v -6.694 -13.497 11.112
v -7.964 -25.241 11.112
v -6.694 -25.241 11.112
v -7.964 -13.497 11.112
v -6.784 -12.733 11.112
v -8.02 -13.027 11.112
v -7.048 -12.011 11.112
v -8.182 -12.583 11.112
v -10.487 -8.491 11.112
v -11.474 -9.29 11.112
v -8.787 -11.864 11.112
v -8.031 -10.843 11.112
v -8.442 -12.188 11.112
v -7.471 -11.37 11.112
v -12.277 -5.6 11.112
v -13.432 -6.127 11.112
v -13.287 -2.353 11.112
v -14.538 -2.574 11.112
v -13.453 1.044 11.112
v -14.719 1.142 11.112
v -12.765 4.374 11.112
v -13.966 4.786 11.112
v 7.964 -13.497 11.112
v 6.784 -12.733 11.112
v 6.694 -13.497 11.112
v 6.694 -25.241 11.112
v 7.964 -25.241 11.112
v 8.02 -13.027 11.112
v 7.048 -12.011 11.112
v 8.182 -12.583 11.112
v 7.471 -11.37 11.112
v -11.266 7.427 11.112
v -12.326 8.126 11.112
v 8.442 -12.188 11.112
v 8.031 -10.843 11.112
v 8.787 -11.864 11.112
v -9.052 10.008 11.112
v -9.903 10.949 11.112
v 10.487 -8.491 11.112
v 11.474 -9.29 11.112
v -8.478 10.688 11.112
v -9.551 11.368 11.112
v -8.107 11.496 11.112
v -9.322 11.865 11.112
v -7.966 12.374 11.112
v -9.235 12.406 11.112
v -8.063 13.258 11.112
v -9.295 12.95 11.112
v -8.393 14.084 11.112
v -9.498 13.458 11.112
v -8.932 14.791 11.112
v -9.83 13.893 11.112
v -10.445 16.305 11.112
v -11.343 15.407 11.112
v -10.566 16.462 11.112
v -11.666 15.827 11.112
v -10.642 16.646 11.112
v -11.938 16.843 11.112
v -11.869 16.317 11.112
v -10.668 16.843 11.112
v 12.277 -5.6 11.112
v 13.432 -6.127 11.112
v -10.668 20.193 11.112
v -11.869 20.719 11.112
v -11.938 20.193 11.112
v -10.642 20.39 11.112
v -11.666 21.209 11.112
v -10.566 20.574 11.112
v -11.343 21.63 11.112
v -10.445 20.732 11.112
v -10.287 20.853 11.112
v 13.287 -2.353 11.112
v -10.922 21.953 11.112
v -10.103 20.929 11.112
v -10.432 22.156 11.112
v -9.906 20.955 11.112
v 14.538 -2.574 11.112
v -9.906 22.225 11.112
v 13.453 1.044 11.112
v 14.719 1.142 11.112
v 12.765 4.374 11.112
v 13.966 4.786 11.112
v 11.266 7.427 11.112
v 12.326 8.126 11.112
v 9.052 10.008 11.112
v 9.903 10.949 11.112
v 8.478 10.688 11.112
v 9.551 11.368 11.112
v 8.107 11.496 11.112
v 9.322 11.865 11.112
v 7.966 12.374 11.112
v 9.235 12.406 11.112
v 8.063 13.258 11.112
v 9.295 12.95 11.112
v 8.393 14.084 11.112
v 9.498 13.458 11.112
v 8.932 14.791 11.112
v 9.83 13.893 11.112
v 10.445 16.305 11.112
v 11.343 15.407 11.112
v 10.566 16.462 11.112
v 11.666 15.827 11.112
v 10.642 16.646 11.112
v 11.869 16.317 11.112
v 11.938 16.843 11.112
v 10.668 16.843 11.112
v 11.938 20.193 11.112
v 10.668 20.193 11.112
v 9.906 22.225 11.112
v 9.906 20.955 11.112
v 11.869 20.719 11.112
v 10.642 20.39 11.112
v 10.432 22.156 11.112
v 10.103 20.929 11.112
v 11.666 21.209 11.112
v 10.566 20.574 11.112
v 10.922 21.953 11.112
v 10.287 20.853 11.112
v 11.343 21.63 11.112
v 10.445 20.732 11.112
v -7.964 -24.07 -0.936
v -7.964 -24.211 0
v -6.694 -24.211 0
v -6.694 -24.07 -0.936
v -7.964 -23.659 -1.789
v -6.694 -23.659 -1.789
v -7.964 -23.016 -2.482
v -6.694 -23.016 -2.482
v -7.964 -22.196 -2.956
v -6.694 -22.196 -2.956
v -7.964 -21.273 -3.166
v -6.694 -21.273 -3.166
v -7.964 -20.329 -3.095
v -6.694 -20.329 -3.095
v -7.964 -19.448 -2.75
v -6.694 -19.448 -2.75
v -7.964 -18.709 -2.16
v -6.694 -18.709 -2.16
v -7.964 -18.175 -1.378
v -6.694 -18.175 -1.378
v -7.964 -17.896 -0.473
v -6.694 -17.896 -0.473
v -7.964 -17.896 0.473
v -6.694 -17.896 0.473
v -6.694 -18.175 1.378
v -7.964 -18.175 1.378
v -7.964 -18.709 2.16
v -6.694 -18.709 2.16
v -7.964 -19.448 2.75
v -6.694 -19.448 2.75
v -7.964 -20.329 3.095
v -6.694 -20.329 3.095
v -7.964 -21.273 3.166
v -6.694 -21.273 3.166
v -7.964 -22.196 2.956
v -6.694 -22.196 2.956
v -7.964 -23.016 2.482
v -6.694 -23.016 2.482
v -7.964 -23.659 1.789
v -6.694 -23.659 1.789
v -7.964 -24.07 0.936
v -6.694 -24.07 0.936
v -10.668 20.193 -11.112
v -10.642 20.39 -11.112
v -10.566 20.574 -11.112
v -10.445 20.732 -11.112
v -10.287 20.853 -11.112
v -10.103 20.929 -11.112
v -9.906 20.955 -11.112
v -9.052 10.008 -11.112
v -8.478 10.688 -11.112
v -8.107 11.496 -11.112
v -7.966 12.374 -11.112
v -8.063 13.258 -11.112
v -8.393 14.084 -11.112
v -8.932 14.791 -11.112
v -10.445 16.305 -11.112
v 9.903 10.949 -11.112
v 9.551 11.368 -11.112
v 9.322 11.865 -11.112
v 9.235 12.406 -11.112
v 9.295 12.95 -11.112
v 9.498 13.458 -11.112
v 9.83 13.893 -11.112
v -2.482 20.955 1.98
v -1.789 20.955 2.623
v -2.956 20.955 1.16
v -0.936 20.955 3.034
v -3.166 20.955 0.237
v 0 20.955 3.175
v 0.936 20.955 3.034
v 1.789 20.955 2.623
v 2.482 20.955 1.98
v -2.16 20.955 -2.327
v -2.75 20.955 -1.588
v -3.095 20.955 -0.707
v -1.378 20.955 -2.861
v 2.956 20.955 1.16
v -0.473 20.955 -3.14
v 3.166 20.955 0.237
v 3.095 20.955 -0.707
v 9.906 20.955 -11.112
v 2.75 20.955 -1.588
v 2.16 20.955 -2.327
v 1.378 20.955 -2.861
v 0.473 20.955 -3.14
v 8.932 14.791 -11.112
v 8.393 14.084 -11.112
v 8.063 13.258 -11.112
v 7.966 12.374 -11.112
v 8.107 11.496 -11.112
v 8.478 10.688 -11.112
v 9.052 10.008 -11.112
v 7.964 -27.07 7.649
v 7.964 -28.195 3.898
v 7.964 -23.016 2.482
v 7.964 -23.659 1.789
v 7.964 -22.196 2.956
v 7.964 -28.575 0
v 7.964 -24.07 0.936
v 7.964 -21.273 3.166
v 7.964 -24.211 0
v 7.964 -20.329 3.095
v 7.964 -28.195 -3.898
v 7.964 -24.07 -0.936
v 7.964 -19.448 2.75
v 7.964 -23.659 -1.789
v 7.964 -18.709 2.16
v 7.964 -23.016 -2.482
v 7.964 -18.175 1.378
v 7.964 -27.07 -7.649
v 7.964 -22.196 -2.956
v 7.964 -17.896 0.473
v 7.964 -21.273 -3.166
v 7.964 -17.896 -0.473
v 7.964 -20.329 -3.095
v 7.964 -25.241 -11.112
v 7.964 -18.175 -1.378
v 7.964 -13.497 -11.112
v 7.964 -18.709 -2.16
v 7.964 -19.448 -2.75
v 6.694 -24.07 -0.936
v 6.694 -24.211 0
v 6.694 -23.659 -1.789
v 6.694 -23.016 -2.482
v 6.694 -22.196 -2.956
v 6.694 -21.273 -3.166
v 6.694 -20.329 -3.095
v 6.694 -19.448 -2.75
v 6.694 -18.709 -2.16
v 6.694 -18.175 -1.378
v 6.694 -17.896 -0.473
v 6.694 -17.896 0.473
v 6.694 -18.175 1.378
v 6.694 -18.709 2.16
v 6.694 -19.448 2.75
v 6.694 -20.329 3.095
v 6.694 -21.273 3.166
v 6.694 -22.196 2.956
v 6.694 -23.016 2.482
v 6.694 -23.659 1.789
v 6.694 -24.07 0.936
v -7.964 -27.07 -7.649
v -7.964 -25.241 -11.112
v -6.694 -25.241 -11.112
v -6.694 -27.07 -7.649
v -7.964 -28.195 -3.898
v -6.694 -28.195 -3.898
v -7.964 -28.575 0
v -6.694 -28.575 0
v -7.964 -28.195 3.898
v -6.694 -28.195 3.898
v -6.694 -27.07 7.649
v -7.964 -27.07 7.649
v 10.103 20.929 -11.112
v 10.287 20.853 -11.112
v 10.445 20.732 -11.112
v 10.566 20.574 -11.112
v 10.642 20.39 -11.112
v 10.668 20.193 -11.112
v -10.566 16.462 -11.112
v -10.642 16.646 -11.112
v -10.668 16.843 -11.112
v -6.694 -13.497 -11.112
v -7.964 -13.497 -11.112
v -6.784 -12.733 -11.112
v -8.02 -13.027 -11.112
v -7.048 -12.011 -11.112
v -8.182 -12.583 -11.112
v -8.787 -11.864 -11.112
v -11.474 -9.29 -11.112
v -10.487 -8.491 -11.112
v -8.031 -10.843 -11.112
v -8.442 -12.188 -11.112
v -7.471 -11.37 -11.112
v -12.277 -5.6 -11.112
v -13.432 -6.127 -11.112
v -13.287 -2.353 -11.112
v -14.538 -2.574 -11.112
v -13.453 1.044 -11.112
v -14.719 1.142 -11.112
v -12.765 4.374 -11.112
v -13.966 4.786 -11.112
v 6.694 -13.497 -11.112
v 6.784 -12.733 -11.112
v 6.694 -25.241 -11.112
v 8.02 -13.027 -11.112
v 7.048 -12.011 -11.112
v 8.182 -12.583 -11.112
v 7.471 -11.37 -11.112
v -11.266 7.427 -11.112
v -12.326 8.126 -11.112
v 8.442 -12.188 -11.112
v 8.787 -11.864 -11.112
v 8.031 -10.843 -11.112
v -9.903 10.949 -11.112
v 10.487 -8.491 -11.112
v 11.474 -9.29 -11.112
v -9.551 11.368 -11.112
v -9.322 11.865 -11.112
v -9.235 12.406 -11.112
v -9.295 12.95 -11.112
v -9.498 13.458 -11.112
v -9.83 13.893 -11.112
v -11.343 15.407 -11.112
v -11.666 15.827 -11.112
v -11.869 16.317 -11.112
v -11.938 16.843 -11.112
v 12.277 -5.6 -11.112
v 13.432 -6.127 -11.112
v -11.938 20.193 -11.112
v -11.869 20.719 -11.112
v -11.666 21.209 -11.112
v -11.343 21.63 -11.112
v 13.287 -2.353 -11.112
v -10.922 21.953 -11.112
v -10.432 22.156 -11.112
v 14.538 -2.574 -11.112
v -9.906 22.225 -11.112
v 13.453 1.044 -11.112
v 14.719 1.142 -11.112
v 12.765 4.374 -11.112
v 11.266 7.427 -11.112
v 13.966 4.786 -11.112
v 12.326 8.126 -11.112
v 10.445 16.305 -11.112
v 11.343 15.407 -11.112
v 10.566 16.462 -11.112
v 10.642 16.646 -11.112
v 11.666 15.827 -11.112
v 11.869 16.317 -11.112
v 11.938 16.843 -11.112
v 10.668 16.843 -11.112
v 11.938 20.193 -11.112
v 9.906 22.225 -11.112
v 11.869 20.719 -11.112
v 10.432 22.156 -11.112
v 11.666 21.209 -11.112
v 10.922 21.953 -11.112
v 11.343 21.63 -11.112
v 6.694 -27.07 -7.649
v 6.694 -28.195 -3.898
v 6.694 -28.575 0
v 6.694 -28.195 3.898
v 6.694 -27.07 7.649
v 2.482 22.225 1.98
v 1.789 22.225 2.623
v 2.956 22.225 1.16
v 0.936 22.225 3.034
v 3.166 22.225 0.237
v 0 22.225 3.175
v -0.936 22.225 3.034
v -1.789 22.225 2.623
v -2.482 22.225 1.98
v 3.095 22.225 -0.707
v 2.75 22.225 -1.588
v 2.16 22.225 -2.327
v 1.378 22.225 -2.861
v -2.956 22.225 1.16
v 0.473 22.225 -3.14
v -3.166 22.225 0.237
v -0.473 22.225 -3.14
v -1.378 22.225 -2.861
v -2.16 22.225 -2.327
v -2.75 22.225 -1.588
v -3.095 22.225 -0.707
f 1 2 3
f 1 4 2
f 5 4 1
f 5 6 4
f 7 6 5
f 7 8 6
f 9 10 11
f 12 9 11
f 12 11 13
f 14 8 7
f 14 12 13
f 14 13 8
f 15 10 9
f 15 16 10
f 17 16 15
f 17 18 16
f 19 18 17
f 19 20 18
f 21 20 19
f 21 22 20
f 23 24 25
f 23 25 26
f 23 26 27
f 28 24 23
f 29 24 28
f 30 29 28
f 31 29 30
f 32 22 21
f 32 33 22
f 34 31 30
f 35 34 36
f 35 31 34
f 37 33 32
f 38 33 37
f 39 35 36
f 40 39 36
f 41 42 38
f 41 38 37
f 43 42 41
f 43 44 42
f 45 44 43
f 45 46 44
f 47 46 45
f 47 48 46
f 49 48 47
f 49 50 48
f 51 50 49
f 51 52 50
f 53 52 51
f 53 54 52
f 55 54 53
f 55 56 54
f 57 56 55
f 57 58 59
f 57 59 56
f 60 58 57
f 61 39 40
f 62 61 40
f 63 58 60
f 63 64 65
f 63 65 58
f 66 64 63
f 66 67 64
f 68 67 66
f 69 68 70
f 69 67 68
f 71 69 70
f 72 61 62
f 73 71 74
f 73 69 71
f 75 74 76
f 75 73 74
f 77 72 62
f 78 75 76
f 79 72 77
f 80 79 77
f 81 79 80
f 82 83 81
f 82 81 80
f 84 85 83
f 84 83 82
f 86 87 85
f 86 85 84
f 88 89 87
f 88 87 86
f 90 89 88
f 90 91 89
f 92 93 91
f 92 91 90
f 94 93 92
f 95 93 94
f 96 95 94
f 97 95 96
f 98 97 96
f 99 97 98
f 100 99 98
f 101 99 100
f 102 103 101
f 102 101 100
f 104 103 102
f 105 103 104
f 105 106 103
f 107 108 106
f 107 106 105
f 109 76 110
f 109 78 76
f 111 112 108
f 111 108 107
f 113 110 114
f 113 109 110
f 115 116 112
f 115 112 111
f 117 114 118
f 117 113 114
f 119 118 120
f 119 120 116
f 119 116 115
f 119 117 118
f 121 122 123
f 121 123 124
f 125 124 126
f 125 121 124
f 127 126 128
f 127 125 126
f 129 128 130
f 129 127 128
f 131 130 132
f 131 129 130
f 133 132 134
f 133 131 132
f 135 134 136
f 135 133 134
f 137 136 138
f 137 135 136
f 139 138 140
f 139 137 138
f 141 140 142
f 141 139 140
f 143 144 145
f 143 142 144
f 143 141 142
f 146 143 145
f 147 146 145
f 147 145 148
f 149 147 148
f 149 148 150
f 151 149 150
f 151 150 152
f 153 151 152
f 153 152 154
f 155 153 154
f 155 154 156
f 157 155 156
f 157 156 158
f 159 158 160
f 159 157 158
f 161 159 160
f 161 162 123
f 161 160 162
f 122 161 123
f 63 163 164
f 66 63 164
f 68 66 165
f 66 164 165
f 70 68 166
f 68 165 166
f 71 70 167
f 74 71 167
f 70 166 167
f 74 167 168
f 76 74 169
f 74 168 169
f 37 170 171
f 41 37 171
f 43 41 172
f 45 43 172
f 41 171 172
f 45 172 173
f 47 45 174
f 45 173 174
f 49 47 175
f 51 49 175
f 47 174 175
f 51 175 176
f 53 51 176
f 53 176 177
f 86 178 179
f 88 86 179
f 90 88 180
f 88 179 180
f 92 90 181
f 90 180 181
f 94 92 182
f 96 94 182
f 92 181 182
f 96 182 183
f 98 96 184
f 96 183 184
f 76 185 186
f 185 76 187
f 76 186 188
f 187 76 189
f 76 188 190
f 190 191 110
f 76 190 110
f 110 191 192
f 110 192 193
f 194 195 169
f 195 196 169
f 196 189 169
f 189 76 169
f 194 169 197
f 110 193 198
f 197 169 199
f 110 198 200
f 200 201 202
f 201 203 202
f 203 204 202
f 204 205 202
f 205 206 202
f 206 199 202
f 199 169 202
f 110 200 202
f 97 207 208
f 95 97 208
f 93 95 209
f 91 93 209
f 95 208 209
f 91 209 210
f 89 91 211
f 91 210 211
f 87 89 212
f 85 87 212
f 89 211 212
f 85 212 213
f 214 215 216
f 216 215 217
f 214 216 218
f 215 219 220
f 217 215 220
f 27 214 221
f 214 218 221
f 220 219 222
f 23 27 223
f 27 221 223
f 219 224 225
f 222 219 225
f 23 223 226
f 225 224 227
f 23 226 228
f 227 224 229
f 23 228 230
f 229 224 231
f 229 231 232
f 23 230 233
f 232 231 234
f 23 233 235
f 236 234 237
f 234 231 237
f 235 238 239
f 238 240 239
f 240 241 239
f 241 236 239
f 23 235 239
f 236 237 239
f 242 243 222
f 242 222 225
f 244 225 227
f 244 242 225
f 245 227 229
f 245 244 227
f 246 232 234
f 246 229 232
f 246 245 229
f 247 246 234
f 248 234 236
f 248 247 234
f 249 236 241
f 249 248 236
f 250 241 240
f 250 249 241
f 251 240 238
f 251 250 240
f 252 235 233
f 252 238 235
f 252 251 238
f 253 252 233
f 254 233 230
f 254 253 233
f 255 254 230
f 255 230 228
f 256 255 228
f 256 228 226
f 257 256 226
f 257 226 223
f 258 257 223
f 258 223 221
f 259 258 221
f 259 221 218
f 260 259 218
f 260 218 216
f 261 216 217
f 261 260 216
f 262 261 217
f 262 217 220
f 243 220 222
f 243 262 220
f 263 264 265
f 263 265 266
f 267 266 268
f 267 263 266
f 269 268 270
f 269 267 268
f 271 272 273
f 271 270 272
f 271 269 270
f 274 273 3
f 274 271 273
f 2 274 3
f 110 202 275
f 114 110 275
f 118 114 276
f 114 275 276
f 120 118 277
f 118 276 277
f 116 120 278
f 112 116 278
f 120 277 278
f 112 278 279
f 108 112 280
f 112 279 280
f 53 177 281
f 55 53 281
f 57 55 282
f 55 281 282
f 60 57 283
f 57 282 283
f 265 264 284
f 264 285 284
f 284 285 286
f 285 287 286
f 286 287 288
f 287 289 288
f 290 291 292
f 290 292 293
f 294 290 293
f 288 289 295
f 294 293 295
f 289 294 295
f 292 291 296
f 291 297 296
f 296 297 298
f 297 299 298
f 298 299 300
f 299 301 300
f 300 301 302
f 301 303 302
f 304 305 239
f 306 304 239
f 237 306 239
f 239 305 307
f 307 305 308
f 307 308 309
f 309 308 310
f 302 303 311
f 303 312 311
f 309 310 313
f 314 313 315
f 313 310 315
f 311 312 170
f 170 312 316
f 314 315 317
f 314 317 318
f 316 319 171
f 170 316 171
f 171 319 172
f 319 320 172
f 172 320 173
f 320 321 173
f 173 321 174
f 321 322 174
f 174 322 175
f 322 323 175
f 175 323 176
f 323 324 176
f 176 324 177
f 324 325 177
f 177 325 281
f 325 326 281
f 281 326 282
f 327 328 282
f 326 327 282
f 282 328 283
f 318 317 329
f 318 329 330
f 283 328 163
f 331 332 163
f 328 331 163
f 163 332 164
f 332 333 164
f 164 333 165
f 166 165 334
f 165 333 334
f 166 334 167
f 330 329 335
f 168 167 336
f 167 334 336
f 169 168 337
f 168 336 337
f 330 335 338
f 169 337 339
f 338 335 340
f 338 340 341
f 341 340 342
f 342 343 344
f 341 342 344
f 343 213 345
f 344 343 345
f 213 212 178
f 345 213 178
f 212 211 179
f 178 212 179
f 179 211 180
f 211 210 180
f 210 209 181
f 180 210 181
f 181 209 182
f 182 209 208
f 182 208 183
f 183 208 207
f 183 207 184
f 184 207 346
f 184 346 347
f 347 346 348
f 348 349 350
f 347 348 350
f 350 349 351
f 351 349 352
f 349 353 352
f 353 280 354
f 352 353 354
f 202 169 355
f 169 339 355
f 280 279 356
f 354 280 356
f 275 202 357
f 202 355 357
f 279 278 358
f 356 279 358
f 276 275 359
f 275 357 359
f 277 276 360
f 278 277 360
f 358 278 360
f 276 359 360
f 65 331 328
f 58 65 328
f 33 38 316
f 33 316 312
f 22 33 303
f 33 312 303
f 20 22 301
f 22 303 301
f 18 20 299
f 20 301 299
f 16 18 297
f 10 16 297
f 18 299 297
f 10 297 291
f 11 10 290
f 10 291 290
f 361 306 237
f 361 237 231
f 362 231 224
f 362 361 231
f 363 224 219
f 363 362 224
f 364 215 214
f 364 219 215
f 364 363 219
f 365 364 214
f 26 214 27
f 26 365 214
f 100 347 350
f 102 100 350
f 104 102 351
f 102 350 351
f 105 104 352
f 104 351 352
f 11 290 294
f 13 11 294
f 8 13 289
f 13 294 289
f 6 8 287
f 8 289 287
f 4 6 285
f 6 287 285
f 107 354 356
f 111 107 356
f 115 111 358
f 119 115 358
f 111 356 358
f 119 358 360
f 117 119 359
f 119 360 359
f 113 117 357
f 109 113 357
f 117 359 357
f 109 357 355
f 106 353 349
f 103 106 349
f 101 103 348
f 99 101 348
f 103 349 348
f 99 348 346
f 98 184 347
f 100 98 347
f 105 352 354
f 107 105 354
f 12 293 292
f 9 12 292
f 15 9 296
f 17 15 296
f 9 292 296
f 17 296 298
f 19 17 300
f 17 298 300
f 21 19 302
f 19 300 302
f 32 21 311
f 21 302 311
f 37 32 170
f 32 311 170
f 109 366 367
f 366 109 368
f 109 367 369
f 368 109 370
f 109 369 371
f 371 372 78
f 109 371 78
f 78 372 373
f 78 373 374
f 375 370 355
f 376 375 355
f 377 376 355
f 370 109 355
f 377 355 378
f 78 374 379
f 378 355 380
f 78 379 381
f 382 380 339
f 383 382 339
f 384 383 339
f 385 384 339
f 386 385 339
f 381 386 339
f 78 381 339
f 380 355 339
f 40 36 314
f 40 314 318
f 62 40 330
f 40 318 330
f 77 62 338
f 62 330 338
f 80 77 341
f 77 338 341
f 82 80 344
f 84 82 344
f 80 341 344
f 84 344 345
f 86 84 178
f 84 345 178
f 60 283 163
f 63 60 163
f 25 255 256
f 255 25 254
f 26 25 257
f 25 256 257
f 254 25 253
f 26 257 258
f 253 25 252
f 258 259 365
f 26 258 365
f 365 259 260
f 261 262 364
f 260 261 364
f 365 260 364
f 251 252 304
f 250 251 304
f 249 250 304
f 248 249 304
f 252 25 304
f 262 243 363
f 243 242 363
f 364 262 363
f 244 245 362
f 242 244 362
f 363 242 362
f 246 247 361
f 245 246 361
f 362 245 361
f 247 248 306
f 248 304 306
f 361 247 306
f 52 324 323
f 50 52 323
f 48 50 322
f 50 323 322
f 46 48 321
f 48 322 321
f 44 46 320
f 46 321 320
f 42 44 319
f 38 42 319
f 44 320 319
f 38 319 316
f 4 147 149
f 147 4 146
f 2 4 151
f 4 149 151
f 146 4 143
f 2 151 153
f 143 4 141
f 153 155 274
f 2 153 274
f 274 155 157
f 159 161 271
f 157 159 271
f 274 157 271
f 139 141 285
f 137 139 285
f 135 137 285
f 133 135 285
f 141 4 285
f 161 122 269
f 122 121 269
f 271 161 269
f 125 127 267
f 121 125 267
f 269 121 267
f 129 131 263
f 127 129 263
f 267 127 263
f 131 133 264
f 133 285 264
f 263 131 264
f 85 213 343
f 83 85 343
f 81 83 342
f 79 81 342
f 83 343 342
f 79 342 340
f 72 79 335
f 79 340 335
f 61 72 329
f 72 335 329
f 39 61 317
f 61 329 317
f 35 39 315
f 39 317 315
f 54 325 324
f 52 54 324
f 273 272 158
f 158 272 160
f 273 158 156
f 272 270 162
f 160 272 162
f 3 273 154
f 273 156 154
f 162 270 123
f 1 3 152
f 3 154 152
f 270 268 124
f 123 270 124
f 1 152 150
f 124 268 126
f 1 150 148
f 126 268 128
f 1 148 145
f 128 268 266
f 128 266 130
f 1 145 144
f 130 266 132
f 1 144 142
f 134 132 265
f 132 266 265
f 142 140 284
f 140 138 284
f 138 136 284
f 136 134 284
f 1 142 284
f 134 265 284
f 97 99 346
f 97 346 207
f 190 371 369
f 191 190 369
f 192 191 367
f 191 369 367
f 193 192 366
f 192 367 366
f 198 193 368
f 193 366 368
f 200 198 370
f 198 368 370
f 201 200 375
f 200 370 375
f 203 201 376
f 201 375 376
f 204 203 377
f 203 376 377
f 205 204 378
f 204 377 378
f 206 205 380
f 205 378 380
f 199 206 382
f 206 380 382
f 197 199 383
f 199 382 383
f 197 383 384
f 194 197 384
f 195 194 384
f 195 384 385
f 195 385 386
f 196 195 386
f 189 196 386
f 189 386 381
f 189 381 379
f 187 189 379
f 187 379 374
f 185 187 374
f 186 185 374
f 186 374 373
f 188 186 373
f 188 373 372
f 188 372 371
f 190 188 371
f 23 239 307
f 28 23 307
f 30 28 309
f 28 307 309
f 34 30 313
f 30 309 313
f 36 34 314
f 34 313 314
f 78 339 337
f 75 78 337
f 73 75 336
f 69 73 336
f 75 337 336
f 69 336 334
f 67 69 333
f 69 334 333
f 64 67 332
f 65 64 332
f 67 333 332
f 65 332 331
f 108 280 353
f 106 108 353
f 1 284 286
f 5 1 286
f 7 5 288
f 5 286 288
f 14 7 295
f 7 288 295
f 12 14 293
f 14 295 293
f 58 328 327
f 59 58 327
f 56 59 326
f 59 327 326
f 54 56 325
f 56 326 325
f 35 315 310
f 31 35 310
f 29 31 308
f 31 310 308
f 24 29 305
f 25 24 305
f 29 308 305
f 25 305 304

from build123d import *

# Parameters (mm, degrees)
BOSS_EXTRUDE1_DEPTH      = 11.1125
BOSS_EXTRUDE1_DEPTH_BACK = 11.1125
SKETCH4_R                = 3.175
CUT_EXTRUDE1_DEPTH       = 22.225
CUT_EXTRUDE2_DEPTH       = 35.029202096
CUT_EXTRUDE2_DEPTH_BACK  = 35.029202096
CUT_EXTRUDE3_DEPTH       = 35.029202096
CUT_EXTRUDE3_DEPTH_BACK  = 35.029202096
SKETCH6_R                = 3.175


with BuildPart() as part:
    # Sketch3 → Boss-Extrude1 (new, two sides: drawn at the far end of the back side and taken through both)
    with BuildSketch(Plane.XY.offset(-BOSS_EXTRUDE1_DEPTH_BACK)):
        with BuildLine():
            Line((-10.668, 16.843375), (-10.668, 20.193))
            ThreePointArc((-10.668, 20.193), (-10.444815367, 20.731815367), (-9.906, 20.955))
            Line((-9.906, 20.955), (9.906, 20.955))
            ThreePointArc((9.906, 20.955), (10.444815367, 20.731815367), (10.668, 20.193))
            Line((10.668, 20.193), (10.668, 16.843375))
            ThreePointArc((10.668, 16.843375), (10.609996204, 16.551770225), (10.444815367, 16.304559633))
            Line((10.444815367, 16.304559633), (8.931602372, 14.791346638))
            ThreePointArc((8.931602372, 14.791346638), (7.965505779, 12.373739179), (9.051510982, 10.007569035))
            ThreePointArc((9.051510982, 10.007569035), (13.477623457, -0.659511197), (8.031189621, -10.84349032))
            ThreePointArc((8.031189621, -10.84349032), (7.047523696, -12.011383636), (6.694468964, -13.496956187))
            Line((6.694468964, -13.496956187), (6.694468964, -28.575))
            Line((6.694468964, -28.575), (7.964468964, -28.575))
            Line((7.964468964, -28.575), (7.964468964, -13.496956187))
            ThreePointArc((7.964468964, -13.496956187), (8.181733414, -12.582757694), (8.787066292, -11.864054115))
            ThreePointArc((8.787066292, -11.864054115), (14.746105665, -0.721582839), (9.903417898, 10.949457886))
            ThreePointArc((9.903417898, 10.949457886), (9.235107004, 12.40556259), (9.829627985, 13.893321026))
            Line((9.829627985, 13.893321026), (11.342840979, 15.406534021))
            ThreePointArc((11.342840979, 15.406534021), (11.78332321, 16.065762265), (11.938, 16.843375))
            Line((11.938, 16.843375), (11.938, 20.193))
            ThreePointArc((11.938, 20.193), (11.342840979, 21.629840979), (9.906, 22.225))
            Line((9.906, 22.225), (-9.906, 22.225))
            ThreePointArc((-9.906, 22.225), (-11.342840979, 21.629840979), (-11.938, 20.193))
            Line((-11.938, 20.193), (-11.938, 16.843375))
            ThreePointArc((-11.938, 16.843375), (-11.78332321, 16.065762265), (-11.342840979, 15.406534021))
            Line((-11.342840979, 15.406534021), (-9.829627985, 13.893321026))
            ThreePointArc((-9.829627985, 13.893321026), (-9.235107004, 12.40556259), (-9.903417898, 10.949457886))
            ThreePointArc((-9.903417898, 10.949457886), (-14.746105665, -0.721582839), (-8.787066292, -11.864054115))
            ThreePointArc((-8.787066292, -11.864054115), (-8.181733414, -12.582757694), (-7.964468964, -13.496956187))
            Line((-7.964468964, -13.496956187), (-7.964468964, -28.575))
            Line((-7.964468964, -28.575), (-6.694468964, -28.575))
            Line((-6.694468964, -28.575), (-6.694468964, -13.496956187))
            ThreePointArc((-6.694468964, -13.496956187), (-7.047523696, -12.011383636), (-8.031189621, -10.84349032))
            ThreePointArc((-8.031189621, -10.84349032), (-13.477623457, -0.659511197), (-9.051510982, 10.007569035))
            ThreePointArc((-9.051510982, 10.007569035), (-7.965505779, 12.373739179), (-8.931602372, 14.791346638))
            Line((-8.931602372, 14.791346638), (-10.444815367, 16.304559633))
            ThreePointArc((-10.444815367, 16.304559633), (-10.609996204, 16.551770225), (-10.668, 16.843375))
        make_face()
    extrude(amount=BOSS_EXTRUDE1_DEPTH + BOSS_EXTRUDE1_DEPTH_BACK)

    # Sketch4 → Cut-Extrude1 (cut)
    with BuildSketch(Plane(origin=(0, 22.225, 0), x_dir=(1, 0, 0), z_dir=(0, 1, 0))):
        with Locations(Location((0, 0, 0), (0, 0, 270))):
            Circle(SKETCH4_R)
    extrude(amount=-CUT_EXTRUDE1_DEPTH, mode=Mode.SUBTRACT)

    # Sketch5 → Cut-Extrude2 (cut, two sides: drawn at the far end of the back side and taken through both)
    with BuildSketch(Plane(origin=(0, 0, 0), x_dir=(0, 0, -1), z_dir=(1, 0, 0)).offset(-CUT_EXTRUDE2_DEPTH_BACK)):
        with BuildLine():
            Line((-11.1125, -25.24125), (-11.1125, -31.90875))
            Line((-11.1125, -31.90875), (11.1125, -31.90875))
            Line((11.1125, -31.90875), (11.1125, -25.24125))
            ThreePointArc((11.1125, -25.24125), (0, -28.575), (-11.1125, -25.24125))
        make_face()
    extrude(amount=CUT_EXTRUDE2_DEPTH + CUT_EXTRUDE2_DEPTH_BACK, mode=Mode.SUBTRACT)

    # Sketch6 → Cut-Extrude3 (cut, two sides: drawn at the far end of the back side and taken through both)
    with BuildSketch(Plane(origin=(0, 0, 0), x_dir=(0, 0, -1), z_dir=(1, 0, 0)).offset(-CUT_EXTRUDE3_DEPTH_BACK)):
        with Locations(Location((0, -21.035978094, 0), (0, 0, 270))):
            Circle(SKETCH6_R)
    extrude(amount=CUT_EXTRUDE3_DEPTH + CUT_EXTRUDE3_DEPTH_BACK, mode=Mode.SUBTRACT)


solid = part.part
